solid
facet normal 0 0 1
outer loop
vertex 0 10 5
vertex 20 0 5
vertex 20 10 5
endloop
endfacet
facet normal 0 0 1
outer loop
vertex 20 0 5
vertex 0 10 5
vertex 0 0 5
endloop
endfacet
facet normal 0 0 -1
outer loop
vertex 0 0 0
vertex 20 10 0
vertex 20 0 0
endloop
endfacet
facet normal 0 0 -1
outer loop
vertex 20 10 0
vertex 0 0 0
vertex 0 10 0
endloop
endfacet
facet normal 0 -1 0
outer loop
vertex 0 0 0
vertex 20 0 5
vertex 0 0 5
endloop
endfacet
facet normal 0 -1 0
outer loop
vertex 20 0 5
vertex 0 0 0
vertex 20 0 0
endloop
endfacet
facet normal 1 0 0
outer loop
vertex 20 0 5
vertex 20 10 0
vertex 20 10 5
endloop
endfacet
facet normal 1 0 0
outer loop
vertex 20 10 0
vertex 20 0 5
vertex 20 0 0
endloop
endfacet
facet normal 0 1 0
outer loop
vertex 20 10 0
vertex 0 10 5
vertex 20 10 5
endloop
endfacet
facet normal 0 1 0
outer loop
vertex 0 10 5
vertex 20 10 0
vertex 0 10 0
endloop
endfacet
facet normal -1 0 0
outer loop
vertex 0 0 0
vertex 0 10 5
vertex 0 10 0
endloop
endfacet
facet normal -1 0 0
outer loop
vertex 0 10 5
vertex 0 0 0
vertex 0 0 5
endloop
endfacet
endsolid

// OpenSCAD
// Original test model for the local editor. Dimensions in millimeters.
width = 20;
depth = 10;
height = 5;
cube([width, depth, height]);
